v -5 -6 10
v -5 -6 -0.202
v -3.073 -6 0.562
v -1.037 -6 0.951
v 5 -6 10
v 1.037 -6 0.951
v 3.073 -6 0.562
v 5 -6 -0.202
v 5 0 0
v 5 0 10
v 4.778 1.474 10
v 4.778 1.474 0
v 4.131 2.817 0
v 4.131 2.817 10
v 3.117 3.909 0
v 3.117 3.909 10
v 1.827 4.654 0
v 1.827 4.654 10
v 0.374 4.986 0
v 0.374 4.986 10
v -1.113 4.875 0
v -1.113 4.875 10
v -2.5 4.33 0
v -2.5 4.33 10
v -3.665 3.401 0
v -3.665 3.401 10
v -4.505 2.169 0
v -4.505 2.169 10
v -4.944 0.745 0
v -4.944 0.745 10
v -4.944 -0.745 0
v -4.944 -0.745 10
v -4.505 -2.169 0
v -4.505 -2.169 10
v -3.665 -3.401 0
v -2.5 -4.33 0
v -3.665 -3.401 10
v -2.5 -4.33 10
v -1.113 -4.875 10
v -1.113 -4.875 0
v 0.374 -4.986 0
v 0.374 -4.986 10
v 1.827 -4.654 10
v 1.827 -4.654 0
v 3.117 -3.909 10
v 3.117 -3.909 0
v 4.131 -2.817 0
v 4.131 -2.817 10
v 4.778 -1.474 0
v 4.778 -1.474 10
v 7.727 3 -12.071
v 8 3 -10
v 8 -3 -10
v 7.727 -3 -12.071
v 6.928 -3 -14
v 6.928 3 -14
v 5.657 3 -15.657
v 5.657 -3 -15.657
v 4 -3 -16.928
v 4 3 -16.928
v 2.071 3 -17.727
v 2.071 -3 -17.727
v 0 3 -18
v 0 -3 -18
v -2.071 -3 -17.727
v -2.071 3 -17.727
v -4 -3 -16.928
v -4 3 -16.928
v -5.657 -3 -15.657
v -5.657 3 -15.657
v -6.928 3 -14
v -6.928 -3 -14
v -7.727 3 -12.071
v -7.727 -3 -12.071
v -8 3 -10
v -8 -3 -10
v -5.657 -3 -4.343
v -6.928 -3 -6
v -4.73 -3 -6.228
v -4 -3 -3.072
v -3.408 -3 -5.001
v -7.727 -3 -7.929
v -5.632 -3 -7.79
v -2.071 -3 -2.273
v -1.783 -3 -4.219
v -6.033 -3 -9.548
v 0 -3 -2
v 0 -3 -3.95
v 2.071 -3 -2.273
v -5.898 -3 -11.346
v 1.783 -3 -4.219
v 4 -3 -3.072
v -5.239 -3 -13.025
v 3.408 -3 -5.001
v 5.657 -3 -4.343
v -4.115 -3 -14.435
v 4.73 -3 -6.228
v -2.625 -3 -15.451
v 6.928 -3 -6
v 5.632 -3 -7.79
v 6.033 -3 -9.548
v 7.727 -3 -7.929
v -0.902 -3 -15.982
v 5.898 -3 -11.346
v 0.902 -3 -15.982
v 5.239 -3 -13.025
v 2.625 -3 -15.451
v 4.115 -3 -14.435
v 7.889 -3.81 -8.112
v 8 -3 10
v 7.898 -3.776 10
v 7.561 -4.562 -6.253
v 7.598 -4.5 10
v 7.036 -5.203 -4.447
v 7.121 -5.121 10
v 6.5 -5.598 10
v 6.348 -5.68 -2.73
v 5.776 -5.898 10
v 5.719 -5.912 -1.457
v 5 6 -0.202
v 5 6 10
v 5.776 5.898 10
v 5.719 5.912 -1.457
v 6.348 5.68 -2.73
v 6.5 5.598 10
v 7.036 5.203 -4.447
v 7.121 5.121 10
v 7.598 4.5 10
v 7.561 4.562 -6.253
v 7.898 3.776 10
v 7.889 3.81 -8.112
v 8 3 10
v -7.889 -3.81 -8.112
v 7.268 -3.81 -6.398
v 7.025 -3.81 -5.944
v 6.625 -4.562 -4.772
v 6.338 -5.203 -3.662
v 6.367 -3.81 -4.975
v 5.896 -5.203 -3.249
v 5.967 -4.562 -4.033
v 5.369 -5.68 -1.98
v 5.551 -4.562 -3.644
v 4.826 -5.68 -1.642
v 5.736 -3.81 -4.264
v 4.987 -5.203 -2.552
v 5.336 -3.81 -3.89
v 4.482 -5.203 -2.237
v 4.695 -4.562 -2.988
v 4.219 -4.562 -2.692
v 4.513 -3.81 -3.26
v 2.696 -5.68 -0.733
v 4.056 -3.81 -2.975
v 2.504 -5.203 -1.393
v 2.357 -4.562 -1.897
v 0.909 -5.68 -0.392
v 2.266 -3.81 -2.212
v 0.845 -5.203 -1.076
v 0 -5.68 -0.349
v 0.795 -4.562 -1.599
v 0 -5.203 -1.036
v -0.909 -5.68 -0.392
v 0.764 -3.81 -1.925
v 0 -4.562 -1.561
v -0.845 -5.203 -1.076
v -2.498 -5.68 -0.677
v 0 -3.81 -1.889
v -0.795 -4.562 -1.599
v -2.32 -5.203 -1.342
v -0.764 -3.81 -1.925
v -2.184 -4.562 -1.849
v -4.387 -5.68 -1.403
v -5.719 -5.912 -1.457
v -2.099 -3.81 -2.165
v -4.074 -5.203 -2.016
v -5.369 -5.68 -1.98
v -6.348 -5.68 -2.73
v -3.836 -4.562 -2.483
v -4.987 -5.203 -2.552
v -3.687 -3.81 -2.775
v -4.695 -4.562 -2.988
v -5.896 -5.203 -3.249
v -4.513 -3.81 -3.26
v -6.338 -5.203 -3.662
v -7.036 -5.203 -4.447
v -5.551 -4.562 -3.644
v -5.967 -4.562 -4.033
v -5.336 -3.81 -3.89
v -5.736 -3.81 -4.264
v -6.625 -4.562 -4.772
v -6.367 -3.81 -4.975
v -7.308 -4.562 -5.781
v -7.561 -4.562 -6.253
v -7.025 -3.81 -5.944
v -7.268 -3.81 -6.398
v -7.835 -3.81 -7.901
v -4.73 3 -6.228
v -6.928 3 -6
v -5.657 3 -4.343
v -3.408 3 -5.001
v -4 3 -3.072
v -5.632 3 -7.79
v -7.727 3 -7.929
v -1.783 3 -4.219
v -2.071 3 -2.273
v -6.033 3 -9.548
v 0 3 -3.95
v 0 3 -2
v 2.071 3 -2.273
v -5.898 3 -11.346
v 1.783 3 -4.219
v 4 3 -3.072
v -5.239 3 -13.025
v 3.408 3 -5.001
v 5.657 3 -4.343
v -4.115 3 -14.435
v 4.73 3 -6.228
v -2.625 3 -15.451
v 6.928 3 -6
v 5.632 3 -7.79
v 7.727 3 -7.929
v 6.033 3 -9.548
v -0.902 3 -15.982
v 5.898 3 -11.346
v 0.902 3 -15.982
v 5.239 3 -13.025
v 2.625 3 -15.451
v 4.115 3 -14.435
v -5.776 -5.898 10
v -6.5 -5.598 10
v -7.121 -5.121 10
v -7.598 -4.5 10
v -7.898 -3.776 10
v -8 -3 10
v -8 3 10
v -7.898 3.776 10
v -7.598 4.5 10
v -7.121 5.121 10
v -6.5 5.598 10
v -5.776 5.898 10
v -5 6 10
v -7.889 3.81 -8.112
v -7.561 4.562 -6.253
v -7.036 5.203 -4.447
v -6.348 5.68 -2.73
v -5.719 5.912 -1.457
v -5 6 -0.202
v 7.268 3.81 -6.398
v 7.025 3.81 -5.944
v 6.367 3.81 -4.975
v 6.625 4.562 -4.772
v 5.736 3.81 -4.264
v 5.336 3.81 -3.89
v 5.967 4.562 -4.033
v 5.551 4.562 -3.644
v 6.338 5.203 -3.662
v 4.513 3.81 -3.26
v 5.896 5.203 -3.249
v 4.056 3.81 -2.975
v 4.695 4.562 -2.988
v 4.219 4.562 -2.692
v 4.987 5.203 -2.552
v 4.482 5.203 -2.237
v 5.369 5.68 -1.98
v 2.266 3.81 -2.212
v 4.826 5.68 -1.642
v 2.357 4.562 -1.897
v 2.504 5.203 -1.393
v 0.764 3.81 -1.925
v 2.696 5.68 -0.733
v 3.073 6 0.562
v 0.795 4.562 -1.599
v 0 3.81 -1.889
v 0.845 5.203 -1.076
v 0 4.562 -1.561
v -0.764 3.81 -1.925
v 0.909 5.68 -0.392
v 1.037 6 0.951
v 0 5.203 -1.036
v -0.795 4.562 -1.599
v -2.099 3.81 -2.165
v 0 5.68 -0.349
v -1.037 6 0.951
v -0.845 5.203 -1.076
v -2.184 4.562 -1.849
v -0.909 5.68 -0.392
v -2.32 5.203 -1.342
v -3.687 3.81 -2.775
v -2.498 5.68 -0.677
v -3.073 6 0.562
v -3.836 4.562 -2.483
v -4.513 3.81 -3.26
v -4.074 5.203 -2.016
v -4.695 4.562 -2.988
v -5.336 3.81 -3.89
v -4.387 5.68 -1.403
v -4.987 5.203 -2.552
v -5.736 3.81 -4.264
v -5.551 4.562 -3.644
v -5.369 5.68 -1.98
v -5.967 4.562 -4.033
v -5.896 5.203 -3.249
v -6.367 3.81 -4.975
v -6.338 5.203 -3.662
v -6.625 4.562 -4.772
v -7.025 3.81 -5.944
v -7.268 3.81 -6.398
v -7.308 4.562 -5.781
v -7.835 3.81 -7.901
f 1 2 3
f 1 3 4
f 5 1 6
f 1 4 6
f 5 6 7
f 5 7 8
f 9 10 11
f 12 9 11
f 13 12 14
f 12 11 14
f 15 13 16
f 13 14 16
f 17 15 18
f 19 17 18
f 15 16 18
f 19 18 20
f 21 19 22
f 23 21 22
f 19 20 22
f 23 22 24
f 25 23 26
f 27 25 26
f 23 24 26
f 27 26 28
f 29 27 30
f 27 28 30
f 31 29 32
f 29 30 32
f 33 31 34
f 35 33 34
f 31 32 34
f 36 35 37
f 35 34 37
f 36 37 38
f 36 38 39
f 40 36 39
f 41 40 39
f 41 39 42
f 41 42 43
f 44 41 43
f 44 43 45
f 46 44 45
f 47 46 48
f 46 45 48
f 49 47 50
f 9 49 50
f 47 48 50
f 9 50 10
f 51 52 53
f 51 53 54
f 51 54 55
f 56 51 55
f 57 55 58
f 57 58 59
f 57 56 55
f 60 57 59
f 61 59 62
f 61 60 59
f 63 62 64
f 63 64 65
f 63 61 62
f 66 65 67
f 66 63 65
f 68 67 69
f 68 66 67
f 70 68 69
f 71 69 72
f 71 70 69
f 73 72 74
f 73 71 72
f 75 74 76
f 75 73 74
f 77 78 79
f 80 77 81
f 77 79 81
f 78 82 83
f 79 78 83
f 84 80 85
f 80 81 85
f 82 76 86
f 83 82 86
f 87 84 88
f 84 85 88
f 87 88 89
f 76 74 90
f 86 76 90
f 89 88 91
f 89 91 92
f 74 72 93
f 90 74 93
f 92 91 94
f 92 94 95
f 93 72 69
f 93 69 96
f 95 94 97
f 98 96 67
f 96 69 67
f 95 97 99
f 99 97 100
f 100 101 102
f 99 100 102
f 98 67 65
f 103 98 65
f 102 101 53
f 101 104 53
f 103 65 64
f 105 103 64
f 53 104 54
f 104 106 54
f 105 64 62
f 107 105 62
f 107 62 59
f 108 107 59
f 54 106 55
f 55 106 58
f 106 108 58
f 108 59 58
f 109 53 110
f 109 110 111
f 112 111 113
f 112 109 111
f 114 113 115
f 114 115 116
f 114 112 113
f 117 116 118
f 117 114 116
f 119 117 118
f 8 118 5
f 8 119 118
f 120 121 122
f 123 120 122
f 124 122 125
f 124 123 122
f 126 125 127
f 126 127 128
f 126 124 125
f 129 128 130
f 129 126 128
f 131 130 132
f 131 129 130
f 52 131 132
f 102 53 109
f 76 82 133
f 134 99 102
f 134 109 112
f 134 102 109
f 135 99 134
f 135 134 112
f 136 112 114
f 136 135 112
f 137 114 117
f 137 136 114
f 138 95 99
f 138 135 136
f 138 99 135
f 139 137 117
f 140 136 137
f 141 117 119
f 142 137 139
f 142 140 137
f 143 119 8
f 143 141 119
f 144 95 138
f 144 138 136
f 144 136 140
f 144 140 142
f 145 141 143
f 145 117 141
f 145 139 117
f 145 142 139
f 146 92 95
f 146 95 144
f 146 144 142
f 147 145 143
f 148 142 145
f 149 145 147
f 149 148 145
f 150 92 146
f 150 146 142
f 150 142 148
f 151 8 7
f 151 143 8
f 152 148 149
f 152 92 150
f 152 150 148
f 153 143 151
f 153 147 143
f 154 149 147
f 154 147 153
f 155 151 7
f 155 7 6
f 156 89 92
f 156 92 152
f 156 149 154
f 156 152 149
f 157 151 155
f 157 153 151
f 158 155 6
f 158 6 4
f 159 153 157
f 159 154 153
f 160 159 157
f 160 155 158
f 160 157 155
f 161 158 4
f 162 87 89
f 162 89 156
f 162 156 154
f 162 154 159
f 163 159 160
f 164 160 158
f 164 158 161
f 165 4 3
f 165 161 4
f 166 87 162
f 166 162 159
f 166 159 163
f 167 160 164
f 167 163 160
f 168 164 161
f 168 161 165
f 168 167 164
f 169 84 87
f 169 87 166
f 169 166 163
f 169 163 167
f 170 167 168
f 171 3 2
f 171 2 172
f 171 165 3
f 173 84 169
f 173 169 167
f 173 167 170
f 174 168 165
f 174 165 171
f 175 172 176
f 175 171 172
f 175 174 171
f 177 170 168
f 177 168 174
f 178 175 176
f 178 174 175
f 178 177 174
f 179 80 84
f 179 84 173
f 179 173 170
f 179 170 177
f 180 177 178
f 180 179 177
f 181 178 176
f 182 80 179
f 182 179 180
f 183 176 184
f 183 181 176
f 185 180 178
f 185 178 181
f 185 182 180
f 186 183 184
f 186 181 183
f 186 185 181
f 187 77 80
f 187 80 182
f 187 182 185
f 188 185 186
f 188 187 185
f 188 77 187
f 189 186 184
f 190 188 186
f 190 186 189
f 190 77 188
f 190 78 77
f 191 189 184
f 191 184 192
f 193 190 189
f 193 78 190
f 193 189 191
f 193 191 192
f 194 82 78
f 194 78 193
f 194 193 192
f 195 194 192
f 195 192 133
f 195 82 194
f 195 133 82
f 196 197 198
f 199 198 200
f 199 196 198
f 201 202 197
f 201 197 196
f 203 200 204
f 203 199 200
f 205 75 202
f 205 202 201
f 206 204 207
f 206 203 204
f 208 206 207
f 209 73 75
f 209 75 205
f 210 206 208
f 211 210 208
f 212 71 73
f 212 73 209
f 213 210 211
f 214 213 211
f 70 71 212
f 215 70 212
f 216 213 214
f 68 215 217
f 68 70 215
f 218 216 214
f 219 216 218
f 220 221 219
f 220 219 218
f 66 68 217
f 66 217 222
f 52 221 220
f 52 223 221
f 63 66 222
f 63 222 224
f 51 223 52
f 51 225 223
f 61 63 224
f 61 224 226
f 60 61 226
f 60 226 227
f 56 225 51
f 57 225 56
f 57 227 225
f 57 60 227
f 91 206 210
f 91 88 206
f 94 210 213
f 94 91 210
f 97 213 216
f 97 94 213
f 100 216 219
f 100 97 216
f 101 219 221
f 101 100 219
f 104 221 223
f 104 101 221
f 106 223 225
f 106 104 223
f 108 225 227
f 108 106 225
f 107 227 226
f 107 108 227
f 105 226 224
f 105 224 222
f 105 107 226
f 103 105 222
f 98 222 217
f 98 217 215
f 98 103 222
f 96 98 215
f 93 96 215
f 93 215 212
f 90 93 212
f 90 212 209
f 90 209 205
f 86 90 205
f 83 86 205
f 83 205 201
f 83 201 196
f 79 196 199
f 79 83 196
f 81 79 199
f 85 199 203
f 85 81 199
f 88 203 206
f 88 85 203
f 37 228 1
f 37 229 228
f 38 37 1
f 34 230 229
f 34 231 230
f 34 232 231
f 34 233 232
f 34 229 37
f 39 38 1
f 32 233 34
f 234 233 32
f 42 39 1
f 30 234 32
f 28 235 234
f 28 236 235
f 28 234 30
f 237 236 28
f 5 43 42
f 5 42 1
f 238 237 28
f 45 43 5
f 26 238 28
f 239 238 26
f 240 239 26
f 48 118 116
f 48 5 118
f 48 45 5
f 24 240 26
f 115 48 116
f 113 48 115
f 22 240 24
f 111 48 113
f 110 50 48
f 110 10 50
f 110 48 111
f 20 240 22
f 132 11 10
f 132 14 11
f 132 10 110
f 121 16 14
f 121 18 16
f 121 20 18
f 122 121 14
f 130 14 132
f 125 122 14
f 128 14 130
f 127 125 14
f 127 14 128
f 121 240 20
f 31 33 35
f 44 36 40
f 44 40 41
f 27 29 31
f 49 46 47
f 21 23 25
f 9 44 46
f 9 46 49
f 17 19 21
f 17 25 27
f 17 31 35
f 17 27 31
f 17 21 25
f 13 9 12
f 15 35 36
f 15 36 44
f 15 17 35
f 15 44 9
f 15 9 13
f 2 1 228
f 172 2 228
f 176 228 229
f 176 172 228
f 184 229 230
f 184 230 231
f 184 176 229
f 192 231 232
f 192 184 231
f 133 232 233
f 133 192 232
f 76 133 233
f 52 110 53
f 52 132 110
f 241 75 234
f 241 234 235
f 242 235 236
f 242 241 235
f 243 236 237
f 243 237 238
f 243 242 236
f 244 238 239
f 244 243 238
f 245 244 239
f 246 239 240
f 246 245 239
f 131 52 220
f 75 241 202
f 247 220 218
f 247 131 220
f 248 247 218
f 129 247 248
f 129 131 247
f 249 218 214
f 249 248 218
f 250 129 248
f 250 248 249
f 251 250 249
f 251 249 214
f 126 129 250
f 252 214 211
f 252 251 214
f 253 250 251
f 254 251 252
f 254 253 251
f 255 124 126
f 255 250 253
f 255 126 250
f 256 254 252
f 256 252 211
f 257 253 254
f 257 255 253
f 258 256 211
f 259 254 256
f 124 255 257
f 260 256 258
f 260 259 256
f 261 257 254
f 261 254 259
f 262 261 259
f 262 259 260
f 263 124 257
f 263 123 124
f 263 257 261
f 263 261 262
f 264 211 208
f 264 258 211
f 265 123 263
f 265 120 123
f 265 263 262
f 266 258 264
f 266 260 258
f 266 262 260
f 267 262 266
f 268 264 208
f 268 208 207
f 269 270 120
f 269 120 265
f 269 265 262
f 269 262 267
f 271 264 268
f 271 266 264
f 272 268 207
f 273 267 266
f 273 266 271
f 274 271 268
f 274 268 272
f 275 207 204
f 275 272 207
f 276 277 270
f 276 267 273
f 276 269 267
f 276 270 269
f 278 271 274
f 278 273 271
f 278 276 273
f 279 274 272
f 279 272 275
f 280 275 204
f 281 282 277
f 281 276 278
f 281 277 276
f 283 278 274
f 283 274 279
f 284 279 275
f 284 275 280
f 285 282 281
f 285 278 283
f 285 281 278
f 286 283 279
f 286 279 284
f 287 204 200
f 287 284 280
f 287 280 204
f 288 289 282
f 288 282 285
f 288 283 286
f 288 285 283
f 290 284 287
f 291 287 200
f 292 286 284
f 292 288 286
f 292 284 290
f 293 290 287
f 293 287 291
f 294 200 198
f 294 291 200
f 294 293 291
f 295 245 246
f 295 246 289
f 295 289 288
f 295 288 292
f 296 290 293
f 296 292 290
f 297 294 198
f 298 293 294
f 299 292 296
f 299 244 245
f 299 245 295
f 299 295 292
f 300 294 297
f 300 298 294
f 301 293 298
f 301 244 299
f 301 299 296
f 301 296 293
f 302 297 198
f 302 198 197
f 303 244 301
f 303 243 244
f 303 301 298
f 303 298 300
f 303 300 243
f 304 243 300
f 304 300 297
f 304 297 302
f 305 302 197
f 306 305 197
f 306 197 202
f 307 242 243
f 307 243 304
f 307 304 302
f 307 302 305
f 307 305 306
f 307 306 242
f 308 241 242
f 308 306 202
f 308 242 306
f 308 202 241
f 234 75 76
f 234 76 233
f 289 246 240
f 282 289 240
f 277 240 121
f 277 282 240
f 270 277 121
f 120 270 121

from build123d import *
from OCP.BRepAlgoAPI import BRepAlgoAPI_Cut
from OCP.TopTools import TopTools_ListOfShape

# Parameters (mm, degrees)
BOSS_EXTRUDE2_DEPTH = 6
SKETCH3_4_R         = 8.000000000000005
SKETCH3_4_R_2       = 6.050000000000002
BOSS_EXTRUDE3_DEPTH = 3
FILLET3_R           = 3
SKETCH7_R           = 5
CUT_EXTRUDE2_DEPTH  = 10
FILLET4_START       = -11
FILLET4_DEPTH       = 22


with BuildPart() as part:
    # Sketch3 → Boss-Extrude2 (new, symmetric)
    with BuildSketch(Plane(origin=(0, 0, 0), x_dir=(1, 0, 0), z_dir=(0, 1, 0))):
        with BuildLine():
            Line((8, -10), (8, 10))
            ThreePointArc((8.000000000000002, 10), (-4.43e-15, 1.9999999999999964), (-8.000000000000009, 10.000000000000004))
            Line((-8, 10), (-8, -10))
            Line((-8, -10), (8, -10))
        make_face()
    extrude(amount=BOSS_EXTRUDE2_DEPTH, both=True)

    # Sketch3<4> → Boss-Extrude3 (add, symmetric)
    with BuildSketch(Plane(origin=(0, 0, 0), x_dir=(1, 0, 0), z_dir=(0, 1, 0))):
        with Locations((-2.96e-15, 10.000000000000002)):
            Circle(SKETCH3_4_R)
        with Locations(Location((-2.96e-15, 10.000000000000002, 0), (0, 0, 270))):
            Circle(SKETCH3_4_R_2, mode=Mode.SUBTRACT)
    extrude(amount=BOSS_EXTRUDE3_DEPTH, both=True)

    # Fillet3
    fillet3_edges = [part.edges().sort_by_distance(p)[0] for p in [
        (-5.06e-15, -6, -1.9999999999999947),
        (-5.06e-15, 6, -1.9999999999999947),
    ]]
    fillet(fillet3_edges, radius=FILLET3_R - 0.0001)  # a hair under: the kernel refuses the full size

    # Sketch7 → Cut-Extrude2 (cut)
    with BuildSketch(Plane.XY.offset(10)):
        Circle(SKETCH7_R)
    extrude(amount=-CUT_EXTRUDE2_DEPTH, mode=Mode.SUBTRACT)


with BuildPart() as fillet4_tool:
    # Fillet4: read off the stored shape, not the designer's step
    # Fillet4 outline → Fillet4 (new body)
    with BuildSketch(Plane.XY.offset(FILLET4_START)):
        with BuildLine():
            Line((-8, 6), (-8, 3))
            ThreePointArc((-8, 3), (-7.121320344, 5.121320344), (-5, 6))
            Line((-5, 6), (-8, 6))
        make_face()
        with BuildLine():
            ThreePointArc((-5, -6), (-7.121320344, -5.121320344), (-8, -3))
            Line((-8, -3), (-8, -6))
            Line((-8, -6), (-5, -6))
        make_face()
        with BuildLine():
            Line((8, 6), (5, 6))
            ThreePointArc((5, 6), (7.121320344, 5.121320344), (8, 3))
            Line((8, 3), (8, 6))
        make_face()
        with BuildLine():
            ThreePointArc((8, -3), (7.121320344, -5.121320344), (5, -6))
            Line((5, -6), (8, -6))
            Line((8, -6), (8, -3))
        make_face()
    extrude(amount=FILLET4_DEPTH)


with BuildPart() as part_1:
    add(part.part)

    # Fillet4: cut by fillet4_tool, with a tolerance
    fillet4_stock = TopTools_ListOfShape()
    fillet4_stock.Append(part_1.part.wrapped)
    fillet4_tools = TopTools_ListOfShape()
    fillet4_tools.Append(fillet4_tool.part.wrapped)
    fillet4_cut = BRepAlgoAPI_Cut()
    fillet4_cut.SetArguments(fillet4_stock)
    fillet4_cut.SetTools(fillet4_tools)
    fillet4_cut.SetFuzzyValue(0.00001)
    fillet4_cut.Build()
    add(Compound.cast(fillet4_cut.Shape()).solids(), mode=Mode.REPLACE)


solid = part_1.part
